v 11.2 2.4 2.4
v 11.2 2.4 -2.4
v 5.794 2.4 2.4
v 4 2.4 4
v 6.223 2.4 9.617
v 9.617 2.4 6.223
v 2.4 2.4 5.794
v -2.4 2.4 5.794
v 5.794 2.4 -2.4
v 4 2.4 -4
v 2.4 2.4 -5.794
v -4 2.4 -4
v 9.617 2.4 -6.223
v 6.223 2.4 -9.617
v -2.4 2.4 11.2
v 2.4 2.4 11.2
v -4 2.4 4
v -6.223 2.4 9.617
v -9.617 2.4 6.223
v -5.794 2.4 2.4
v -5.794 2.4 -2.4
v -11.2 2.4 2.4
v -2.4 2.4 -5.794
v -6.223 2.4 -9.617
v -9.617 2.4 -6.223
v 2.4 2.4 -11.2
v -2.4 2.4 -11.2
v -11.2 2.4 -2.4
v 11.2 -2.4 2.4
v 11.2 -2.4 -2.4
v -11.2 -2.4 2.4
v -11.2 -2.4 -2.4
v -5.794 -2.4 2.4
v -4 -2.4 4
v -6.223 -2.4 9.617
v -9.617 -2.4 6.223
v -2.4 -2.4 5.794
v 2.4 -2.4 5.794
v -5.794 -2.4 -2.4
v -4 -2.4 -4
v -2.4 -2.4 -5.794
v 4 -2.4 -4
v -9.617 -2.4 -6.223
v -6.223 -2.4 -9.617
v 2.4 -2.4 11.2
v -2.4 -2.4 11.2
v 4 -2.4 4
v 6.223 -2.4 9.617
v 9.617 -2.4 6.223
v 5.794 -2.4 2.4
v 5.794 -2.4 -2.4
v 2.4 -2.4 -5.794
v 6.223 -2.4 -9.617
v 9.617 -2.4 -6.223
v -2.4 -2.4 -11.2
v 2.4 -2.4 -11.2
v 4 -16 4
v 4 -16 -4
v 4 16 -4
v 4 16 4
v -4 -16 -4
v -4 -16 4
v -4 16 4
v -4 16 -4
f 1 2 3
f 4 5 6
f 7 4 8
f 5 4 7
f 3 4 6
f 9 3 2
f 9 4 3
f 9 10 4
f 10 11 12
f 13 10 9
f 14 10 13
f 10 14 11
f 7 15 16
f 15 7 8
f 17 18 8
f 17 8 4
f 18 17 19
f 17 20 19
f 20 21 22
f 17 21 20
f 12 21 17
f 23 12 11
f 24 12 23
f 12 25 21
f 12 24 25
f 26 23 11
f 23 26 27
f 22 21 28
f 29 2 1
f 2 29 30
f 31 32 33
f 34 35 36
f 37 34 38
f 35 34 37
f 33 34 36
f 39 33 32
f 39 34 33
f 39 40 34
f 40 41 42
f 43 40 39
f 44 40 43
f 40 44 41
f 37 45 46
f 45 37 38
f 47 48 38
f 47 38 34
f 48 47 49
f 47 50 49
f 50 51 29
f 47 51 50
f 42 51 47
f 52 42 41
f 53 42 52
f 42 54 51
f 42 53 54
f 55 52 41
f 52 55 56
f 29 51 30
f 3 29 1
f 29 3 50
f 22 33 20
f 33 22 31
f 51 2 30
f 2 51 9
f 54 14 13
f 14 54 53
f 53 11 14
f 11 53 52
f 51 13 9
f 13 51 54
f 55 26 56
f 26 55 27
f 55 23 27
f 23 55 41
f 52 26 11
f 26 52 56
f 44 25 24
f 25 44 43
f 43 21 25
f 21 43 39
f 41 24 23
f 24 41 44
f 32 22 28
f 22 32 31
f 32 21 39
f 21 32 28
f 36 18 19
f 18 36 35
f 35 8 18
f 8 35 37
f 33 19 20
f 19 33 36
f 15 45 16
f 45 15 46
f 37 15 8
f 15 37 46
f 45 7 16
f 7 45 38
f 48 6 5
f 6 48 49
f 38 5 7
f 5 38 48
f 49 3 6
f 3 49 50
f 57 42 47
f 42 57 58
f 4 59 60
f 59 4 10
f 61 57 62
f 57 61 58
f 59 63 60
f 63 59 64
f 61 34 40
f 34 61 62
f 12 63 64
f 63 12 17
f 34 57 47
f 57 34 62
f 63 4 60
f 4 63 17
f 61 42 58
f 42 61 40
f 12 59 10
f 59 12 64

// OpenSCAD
size=32; //block=32 //item=8
sides=8;

module gear (){
cube([size*0.25,size*0.25,size*1],center=true);

for(curr=[0:1:sides]){
rotate([0,90,0]){
rotate([360/sides*curr,0,0]){
translate([0,0,size*0.1]){
cube([size*0.15,size*0.15,size*0.5],center=true);
};	//translate
};	//rotate
};	//rotate

};	//for
};	//gear

rotate([90,0,0]){
translate([size*0.5,0,0]){
rotate([0,0,360/sides*0.5]){
//%gear();
};	//rotate
};	//translate
translate([-size*0.5,0,0]){
//%gear();
};	//translate
gear();

};	//rotate
